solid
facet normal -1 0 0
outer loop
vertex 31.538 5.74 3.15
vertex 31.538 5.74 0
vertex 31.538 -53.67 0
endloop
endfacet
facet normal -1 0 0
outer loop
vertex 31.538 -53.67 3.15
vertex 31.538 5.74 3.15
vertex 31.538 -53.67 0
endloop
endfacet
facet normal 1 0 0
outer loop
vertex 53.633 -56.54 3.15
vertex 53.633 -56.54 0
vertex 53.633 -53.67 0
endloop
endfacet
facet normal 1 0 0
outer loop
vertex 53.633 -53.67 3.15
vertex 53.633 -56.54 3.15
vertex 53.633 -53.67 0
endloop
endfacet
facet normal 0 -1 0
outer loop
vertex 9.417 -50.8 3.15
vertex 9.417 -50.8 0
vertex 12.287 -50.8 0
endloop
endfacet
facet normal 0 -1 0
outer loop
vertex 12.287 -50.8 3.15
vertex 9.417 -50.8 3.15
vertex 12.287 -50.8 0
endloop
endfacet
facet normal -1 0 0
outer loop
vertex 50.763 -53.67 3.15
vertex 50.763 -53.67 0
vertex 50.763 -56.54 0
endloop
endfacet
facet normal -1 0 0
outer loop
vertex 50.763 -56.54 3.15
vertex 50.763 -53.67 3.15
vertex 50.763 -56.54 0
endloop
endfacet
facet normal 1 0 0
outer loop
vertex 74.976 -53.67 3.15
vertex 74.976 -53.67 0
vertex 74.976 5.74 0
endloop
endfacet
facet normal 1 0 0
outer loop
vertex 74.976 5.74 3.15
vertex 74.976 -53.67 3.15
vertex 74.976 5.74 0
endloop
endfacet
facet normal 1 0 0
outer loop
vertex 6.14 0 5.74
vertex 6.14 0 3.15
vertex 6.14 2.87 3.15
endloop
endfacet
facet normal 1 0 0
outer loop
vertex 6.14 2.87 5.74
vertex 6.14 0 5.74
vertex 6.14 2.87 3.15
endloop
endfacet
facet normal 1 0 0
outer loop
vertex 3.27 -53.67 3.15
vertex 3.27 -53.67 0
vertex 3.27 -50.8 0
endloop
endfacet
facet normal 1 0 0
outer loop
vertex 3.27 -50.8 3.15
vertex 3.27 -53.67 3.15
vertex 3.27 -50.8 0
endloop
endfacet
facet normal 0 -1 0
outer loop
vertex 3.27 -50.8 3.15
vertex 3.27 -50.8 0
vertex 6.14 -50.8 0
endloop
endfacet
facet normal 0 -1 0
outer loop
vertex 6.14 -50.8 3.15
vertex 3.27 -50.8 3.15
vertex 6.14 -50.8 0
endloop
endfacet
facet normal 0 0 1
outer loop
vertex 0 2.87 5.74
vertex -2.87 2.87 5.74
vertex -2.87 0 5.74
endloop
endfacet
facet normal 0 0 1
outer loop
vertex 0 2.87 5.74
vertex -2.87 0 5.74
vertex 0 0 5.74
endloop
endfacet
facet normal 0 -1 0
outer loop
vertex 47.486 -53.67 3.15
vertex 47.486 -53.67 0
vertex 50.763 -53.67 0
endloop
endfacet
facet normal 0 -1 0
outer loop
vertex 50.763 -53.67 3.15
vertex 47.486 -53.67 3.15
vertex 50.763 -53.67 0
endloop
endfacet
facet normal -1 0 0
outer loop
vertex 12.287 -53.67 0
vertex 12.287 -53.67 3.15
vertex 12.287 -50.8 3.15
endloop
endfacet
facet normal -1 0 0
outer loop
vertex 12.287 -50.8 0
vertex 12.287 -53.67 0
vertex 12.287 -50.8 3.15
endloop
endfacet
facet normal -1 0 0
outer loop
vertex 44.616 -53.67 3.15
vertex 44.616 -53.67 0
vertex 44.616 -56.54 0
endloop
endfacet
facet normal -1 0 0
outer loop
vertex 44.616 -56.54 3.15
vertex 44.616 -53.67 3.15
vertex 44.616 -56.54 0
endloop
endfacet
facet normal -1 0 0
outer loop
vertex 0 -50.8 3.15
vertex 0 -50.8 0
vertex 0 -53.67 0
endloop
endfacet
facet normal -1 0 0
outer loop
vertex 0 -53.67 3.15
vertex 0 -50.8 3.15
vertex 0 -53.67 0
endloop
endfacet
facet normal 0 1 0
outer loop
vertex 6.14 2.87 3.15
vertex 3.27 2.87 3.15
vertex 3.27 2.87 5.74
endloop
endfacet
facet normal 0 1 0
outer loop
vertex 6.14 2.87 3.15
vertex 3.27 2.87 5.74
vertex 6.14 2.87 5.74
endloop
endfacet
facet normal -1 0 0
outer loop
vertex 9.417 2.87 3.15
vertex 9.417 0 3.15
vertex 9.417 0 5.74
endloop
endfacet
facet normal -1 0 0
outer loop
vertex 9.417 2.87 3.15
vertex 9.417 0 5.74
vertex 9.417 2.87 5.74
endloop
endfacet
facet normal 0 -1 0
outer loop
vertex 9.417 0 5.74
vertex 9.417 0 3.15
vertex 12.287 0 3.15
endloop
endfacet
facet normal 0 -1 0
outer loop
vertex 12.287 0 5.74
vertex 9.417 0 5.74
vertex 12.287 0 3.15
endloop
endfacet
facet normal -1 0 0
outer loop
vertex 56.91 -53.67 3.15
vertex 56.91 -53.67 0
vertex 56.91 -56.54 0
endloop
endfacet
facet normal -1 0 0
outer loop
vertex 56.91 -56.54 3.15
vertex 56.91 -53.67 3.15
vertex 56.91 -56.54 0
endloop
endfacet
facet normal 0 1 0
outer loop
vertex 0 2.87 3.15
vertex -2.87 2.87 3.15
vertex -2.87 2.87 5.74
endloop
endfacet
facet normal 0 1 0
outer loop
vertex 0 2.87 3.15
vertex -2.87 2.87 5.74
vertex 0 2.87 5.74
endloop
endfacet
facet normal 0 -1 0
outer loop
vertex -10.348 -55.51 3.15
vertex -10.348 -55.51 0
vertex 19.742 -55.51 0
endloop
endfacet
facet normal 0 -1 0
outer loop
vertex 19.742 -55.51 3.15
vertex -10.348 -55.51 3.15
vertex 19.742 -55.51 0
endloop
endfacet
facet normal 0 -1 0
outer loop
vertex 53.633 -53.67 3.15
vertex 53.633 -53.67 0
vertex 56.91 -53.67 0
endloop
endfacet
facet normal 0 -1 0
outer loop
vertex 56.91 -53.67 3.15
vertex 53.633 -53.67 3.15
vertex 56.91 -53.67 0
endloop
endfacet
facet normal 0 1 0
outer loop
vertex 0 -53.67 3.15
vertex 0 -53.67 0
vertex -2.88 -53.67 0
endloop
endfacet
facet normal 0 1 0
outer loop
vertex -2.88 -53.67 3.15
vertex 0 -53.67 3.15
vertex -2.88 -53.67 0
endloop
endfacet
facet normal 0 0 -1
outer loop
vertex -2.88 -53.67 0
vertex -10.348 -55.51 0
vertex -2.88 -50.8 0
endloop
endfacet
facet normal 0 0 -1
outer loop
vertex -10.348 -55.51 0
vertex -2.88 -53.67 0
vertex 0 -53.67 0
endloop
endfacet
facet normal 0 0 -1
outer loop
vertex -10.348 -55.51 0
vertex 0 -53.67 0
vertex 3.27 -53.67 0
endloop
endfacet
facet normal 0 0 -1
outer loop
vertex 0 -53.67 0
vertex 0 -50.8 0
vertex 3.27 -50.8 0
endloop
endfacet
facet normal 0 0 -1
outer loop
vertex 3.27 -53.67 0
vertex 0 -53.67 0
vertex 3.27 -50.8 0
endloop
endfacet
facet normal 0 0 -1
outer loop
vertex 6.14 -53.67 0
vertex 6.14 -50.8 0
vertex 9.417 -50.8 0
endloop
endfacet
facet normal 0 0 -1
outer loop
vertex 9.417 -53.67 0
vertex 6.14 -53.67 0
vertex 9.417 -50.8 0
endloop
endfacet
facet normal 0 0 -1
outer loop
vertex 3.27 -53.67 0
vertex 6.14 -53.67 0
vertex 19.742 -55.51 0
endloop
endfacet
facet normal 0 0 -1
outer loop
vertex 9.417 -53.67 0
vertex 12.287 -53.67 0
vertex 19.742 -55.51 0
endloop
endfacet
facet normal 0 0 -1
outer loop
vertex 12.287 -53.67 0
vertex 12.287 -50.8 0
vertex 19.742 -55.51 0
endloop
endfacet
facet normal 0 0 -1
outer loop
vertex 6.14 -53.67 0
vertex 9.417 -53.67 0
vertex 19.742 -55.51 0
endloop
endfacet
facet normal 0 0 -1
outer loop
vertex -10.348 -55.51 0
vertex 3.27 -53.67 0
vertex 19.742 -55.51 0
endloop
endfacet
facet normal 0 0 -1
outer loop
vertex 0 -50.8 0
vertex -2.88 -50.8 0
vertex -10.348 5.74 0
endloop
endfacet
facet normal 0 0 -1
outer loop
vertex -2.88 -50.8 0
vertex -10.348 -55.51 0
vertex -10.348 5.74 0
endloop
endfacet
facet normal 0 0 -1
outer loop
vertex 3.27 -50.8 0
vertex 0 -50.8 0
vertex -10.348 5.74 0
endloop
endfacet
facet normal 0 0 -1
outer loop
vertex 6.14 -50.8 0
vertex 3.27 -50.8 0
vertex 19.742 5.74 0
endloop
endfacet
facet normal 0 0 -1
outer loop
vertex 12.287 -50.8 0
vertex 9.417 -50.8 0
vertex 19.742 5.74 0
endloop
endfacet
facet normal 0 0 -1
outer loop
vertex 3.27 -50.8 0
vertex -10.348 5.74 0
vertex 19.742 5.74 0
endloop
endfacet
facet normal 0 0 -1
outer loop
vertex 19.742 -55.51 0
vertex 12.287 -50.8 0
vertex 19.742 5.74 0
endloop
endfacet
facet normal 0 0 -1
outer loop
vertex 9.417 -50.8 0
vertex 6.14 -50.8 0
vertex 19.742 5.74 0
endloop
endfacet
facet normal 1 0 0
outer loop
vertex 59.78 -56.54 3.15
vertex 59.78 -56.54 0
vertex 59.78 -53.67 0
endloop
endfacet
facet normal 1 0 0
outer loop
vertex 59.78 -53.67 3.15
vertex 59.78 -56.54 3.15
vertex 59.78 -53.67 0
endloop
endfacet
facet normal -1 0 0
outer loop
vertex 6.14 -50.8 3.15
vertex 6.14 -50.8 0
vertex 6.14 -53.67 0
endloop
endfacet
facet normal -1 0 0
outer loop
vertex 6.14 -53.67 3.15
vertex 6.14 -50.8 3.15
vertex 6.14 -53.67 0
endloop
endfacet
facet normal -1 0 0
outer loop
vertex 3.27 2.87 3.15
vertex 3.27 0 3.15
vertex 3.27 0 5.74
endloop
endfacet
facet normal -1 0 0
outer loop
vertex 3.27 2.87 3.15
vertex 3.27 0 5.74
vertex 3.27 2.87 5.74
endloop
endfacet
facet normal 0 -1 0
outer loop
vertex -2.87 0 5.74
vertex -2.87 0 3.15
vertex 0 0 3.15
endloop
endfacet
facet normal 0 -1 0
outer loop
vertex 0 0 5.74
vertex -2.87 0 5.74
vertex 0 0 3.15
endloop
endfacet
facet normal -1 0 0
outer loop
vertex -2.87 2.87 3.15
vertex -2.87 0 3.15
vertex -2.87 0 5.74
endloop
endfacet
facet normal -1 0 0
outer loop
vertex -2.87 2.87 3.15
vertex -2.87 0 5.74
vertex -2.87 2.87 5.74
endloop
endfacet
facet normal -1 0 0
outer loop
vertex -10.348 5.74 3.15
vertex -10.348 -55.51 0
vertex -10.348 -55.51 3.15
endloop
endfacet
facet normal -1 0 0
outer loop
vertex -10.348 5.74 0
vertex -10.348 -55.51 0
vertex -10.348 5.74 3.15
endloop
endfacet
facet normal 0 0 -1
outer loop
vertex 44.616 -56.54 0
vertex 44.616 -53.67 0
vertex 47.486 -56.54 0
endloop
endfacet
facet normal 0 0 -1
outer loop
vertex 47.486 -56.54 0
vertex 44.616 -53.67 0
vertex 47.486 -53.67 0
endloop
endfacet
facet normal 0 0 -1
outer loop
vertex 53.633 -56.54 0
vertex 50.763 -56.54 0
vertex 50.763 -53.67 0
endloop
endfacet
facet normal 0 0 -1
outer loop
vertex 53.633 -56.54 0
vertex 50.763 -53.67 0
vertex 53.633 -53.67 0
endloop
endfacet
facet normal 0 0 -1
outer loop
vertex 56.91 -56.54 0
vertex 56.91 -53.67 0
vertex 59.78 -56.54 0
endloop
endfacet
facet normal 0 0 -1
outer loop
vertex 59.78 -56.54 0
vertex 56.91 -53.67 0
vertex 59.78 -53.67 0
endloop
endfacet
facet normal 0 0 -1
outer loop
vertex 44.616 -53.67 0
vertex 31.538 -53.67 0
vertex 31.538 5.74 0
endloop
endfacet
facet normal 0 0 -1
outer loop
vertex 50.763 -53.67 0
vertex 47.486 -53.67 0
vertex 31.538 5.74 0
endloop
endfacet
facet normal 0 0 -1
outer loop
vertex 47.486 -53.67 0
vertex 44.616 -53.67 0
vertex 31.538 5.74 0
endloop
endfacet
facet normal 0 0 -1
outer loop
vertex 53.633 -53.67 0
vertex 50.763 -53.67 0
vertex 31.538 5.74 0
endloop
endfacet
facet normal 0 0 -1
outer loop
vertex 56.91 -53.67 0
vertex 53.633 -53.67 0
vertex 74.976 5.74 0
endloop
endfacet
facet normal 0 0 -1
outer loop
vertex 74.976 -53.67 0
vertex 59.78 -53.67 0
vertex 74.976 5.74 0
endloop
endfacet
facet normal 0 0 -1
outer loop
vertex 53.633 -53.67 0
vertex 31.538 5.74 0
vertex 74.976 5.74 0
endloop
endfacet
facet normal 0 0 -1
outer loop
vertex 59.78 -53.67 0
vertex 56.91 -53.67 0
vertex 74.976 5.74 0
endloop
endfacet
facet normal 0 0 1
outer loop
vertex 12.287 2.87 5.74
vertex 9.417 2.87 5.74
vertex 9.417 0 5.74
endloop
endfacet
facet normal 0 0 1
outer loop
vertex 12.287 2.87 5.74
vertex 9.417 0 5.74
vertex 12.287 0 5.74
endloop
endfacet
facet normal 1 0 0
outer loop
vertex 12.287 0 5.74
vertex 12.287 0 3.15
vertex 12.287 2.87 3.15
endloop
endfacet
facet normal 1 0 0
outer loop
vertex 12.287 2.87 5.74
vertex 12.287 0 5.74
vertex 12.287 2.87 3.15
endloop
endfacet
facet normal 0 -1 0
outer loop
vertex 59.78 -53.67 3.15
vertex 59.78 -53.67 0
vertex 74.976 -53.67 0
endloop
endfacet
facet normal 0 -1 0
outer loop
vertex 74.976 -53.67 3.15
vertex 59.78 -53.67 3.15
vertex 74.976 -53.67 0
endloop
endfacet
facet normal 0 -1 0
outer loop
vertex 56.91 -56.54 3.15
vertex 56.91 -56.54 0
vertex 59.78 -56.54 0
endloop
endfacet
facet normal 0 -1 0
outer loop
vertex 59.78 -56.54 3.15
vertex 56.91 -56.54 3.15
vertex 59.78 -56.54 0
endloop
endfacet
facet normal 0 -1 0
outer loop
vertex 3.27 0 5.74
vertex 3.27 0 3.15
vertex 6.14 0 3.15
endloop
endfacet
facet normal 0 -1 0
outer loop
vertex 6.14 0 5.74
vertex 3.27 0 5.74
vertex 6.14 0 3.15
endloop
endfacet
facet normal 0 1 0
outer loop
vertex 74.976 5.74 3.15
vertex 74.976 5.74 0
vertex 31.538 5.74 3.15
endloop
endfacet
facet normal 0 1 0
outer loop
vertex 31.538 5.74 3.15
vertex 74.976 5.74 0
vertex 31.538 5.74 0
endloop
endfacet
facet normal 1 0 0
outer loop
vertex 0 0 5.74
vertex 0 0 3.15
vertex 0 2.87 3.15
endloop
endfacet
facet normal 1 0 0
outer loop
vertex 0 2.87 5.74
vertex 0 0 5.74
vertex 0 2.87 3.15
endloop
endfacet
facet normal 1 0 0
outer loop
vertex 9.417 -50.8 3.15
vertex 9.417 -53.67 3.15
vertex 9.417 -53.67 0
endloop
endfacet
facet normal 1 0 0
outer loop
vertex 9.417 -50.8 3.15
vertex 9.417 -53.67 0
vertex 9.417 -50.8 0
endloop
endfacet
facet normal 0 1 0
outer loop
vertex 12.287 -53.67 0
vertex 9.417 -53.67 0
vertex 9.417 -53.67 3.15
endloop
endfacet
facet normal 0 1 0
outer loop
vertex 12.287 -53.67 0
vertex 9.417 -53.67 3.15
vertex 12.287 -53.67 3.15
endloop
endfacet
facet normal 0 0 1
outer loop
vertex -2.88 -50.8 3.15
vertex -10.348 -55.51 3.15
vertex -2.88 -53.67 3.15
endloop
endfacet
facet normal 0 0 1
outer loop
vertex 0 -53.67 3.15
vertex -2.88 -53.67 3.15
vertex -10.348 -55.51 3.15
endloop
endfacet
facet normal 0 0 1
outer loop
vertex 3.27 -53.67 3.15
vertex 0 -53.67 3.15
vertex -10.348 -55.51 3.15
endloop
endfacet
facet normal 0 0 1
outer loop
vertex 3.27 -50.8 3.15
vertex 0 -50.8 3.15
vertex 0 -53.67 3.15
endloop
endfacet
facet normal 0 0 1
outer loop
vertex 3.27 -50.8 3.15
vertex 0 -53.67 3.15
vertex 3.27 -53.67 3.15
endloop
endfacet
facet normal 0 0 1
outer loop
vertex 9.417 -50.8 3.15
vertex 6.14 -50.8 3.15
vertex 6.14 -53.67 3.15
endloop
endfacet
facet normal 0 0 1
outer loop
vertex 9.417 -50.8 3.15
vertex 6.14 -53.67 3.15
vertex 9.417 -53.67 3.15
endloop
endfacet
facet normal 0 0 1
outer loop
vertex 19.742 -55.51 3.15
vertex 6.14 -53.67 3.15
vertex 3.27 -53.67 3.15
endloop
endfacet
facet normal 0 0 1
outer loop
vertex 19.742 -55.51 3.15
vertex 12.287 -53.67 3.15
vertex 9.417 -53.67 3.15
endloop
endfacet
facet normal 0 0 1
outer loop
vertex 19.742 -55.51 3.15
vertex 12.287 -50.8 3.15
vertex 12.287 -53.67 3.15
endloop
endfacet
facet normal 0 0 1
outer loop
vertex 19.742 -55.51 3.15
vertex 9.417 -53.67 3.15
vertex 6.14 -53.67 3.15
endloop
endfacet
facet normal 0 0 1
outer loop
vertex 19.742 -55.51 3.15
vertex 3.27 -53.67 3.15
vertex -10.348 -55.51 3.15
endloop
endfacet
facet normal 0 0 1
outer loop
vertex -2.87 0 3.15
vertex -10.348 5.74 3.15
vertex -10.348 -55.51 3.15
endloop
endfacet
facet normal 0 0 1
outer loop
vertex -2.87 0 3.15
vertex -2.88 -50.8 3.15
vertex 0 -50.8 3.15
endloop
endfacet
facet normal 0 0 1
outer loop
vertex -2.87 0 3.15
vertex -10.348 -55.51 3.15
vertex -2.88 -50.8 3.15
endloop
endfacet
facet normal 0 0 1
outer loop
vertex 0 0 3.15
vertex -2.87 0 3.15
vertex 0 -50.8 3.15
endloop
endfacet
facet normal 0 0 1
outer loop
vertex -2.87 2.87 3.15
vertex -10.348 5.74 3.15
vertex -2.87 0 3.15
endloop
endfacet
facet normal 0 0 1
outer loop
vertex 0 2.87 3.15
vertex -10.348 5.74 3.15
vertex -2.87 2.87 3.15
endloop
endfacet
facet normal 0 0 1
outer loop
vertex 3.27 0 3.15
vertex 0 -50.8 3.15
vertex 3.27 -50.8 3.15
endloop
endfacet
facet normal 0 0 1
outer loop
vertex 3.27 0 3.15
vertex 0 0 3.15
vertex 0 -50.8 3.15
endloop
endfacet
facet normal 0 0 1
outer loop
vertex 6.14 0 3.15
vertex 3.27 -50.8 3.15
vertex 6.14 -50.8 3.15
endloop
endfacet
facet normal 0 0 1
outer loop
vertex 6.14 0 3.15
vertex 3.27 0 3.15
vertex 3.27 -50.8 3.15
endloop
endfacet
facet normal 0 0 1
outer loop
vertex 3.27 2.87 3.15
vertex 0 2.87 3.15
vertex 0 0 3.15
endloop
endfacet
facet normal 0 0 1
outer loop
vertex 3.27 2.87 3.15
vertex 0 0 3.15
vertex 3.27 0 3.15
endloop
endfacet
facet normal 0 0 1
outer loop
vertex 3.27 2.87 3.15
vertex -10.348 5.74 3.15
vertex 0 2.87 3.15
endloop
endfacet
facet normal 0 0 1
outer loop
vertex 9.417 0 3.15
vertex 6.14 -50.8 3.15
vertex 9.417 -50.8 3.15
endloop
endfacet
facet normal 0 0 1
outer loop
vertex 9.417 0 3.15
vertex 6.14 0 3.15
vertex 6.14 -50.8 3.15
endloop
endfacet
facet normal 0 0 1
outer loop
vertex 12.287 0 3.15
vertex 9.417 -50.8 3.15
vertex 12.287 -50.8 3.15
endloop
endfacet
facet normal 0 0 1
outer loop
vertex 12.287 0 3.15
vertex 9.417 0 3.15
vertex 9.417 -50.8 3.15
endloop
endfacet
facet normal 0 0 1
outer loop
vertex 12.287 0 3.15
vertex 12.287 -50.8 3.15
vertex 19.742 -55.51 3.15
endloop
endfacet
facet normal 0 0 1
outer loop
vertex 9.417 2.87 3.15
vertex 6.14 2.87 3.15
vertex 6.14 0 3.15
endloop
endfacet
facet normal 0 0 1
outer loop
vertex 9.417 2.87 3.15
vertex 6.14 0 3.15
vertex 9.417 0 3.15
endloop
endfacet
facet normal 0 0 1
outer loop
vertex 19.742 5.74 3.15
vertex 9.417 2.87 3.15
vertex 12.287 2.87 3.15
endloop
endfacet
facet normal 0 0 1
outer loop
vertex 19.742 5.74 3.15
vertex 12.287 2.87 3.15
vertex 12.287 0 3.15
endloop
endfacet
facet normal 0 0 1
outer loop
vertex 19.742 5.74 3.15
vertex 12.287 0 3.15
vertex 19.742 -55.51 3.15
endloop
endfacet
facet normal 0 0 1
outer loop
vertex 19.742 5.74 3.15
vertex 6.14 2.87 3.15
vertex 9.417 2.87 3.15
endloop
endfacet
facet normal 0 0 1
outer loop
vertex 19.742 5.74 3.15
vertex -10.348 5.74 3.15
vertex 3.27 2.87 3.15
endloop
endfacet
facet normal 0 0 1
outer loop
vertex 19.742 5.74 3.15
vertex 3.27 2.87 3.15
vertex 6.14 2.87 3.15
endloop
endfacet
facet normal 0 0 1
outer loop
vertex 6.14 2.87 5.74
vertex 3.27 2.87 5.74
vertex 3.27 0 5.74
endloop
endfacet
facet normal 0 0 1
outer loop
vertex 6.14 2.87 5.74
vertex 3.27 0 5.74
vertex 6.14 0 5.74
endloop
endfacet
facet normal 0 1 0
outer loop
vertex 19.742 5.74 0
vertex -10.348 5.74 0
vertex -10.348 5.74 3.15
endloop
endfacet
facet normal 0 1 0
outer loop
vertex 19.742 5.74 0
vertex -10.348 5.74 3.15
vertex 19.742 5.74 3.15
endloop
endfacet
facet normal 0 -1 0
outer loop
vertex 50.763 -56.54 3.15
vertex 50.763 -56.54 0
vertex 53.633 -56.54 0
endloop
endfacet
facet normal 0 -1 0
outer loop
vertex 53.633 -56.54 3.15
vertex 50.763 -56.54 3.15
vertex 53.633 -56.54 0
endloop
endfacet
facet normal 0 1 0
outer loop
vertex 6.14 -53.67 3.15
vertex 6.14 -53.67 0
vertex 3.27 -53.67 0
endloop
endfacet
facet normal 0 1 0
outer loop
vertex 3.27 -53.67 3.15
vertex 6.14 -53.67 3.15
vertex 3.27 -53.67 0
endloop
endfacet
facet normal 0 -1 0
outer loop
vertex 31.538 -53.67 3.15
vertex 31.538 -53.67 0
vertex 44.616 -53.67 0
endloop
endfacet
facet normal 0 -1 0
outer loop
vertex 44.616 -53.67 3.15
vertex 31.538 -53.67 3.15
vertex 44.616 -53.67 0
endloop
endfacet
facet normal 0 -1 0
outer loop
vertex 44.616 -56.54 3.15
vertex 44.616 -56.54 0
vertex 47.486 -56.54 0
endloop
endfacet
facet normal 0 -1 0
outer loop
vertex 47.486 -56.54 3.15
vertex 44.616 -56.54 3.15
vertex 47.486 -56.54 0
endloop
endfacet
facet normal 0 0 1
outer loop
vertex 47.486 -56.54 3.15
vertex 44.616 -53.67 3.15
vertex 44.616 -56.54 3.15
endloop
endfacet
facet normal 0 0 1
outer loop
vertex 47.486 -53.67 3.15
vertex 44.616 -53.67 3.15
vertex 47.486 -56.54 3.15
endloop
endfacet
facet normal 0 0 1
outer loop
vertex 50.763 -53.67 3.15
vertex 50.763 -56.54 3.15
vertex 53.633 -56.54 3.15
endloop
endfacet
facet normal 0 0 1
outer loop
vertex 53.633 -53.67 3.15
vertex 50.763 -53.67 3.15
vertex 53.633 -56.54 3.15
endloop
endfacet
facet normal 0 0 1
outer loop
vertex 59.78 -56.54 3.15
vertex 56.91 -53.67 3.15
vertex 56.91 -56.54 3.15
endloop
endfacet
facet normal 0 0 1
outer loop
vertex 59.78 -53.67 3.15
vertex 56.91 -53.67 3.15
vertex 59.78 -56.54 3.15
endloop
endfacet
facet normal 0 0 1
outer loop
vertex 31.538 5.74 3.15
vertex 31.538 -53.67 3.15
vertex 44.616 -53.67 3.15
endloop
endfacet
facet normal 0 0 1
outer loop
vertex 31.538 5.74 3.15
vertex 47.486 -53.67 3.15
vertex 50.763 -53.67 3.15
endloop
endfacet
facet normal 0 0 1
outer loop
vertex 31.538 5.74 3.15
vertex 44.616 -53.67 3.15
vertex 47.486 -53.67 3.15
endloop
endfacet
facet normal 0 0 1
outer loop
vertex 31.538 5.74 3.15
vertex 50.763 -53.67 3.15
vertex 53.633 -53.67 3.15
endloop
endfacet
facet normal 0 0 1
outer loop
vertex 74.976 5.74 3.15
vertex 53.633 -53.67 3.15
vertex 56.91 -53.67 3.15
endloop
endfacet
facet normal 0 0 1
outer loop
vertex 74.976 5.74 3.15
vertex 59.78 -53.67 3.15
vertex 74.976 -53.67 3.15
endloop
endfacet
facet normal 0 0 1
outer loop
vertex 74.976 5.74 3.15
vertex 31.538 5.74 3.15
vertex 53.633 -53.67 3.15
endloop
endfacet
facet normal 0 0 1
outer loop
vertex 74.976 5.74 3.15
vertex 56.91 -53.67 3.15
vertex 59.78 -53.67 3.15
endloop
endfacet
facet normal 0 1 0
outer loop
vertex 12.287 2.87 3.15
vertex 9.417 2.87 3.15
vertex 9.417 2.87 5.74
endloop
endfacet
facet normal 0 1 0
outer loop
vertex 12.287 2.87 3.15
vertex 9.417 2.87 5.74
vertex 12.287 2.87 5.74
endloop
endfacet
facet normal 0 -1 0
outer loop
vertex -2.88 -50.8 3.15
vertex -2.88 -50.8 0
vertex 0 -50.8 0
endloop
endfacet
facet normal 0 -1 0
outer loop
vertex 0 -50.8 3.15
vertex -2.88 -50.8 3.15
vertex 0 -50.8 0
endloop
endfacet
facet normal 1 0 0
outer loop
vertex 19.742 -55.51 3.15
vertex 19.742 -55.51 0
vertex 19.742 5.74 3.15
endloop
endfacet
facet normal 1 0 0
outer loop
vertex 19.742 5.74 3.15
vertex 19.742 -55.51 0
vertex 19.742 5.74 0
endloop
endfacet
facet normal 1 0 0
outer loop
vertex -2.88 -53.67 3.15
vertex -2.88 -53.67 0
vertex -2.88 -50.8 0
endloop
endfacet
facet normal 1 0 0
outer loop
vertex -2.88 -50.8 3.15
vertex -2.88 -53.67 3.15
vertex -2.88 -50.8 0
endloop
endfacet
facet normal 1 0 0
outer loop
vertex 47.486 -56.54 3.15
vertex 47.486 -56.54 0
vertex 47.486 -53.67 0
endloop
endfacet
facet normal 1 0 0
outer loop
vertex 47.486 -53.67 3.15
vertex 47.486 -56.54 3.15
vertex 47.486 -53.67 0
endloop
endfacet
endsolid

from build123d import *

# Parameters (mm, degrees)
F0_W     = 30.09
F0_H     = 61.25
F0_W_2   = 2.8702
F0_H_2   = 2.8702
F1_DEPTH = 3.15
F2_DEPTH = 5.7404


with BuildPart() as f1:
    # F0 (on Top) → F1 (new body)
    with BuildSketch(Plane.XY):
        with Locations((4.6974, -24.8846)):
            Rectangle(F0_W, F0_H)
        Polygon((0, -53.6702), (-2.88, -53.6702), (-2.88, -50.8), (-0.0098, -50.8), (0, -50.8), align=None, mode=Mode.SUBTRACT)
        Polygon((3.27, -53.6702), (3.27, -50.8), (6.1386, -50.8), (6.1402, -50.8), (6.1402, -53.6702), align=None, mode=Mode.SUBTRACT)
        with Locations((10.8519, -52.2351)):
            Rectangle(F0_W_2, F0_H_2, mode=Mode.SUBTRACT)
        with Locations((-1.4351, 1.4351)):
            Rectangle(F0_W_2, F0_H_2, mode=Mode.SUBTRACT)
        with Locations((4.7051, 1.4351)):
            Rectangle(F0_W_2, F0_H_2, mode=Mode.SUBTRACT)
        with Locations((10.8519, 1.4351)):
            Rectangle(F0_W_2, F0_H_2, mode=Mode.SUBTRACT)
        Polygon((31.538078, 5.7404), (31.538078, -53.6702), (44.615903, -53.6702), (44.615903, -56.5404), (47.486103, -56.5404), (47.486103, -53.6702), (50.762703, -53.6702), (50.762703, -56.5404), (53.632903, -56.5404), (53.632903, -53.6702), (56.909503, -53.6702), (56.909503, -56.5404), (59.779703, -56.5404), (59.779703, -53.6702), (74.975652, -53.6702), (74.975652, 5.7404), align=None)
    extrude(amount=F1_DEPTH)

    # F0 (on Top) → F2 (join)
    with BuildSketch(Plane.XY):
        with Locations((10.8519, 1.4351)):
            Rectangle(F0_W_2, F0_H_2)
        with Locations((4.7051, 1.4351)):
            Rectangle(F0_W_2, F0_H_2)
        with Locations((-1.4351, 1.4351)):
            Rectangle(F0_W_2, F0_H_2)
    extrude(amount=F2_DEPTH)


solid = f1.part
